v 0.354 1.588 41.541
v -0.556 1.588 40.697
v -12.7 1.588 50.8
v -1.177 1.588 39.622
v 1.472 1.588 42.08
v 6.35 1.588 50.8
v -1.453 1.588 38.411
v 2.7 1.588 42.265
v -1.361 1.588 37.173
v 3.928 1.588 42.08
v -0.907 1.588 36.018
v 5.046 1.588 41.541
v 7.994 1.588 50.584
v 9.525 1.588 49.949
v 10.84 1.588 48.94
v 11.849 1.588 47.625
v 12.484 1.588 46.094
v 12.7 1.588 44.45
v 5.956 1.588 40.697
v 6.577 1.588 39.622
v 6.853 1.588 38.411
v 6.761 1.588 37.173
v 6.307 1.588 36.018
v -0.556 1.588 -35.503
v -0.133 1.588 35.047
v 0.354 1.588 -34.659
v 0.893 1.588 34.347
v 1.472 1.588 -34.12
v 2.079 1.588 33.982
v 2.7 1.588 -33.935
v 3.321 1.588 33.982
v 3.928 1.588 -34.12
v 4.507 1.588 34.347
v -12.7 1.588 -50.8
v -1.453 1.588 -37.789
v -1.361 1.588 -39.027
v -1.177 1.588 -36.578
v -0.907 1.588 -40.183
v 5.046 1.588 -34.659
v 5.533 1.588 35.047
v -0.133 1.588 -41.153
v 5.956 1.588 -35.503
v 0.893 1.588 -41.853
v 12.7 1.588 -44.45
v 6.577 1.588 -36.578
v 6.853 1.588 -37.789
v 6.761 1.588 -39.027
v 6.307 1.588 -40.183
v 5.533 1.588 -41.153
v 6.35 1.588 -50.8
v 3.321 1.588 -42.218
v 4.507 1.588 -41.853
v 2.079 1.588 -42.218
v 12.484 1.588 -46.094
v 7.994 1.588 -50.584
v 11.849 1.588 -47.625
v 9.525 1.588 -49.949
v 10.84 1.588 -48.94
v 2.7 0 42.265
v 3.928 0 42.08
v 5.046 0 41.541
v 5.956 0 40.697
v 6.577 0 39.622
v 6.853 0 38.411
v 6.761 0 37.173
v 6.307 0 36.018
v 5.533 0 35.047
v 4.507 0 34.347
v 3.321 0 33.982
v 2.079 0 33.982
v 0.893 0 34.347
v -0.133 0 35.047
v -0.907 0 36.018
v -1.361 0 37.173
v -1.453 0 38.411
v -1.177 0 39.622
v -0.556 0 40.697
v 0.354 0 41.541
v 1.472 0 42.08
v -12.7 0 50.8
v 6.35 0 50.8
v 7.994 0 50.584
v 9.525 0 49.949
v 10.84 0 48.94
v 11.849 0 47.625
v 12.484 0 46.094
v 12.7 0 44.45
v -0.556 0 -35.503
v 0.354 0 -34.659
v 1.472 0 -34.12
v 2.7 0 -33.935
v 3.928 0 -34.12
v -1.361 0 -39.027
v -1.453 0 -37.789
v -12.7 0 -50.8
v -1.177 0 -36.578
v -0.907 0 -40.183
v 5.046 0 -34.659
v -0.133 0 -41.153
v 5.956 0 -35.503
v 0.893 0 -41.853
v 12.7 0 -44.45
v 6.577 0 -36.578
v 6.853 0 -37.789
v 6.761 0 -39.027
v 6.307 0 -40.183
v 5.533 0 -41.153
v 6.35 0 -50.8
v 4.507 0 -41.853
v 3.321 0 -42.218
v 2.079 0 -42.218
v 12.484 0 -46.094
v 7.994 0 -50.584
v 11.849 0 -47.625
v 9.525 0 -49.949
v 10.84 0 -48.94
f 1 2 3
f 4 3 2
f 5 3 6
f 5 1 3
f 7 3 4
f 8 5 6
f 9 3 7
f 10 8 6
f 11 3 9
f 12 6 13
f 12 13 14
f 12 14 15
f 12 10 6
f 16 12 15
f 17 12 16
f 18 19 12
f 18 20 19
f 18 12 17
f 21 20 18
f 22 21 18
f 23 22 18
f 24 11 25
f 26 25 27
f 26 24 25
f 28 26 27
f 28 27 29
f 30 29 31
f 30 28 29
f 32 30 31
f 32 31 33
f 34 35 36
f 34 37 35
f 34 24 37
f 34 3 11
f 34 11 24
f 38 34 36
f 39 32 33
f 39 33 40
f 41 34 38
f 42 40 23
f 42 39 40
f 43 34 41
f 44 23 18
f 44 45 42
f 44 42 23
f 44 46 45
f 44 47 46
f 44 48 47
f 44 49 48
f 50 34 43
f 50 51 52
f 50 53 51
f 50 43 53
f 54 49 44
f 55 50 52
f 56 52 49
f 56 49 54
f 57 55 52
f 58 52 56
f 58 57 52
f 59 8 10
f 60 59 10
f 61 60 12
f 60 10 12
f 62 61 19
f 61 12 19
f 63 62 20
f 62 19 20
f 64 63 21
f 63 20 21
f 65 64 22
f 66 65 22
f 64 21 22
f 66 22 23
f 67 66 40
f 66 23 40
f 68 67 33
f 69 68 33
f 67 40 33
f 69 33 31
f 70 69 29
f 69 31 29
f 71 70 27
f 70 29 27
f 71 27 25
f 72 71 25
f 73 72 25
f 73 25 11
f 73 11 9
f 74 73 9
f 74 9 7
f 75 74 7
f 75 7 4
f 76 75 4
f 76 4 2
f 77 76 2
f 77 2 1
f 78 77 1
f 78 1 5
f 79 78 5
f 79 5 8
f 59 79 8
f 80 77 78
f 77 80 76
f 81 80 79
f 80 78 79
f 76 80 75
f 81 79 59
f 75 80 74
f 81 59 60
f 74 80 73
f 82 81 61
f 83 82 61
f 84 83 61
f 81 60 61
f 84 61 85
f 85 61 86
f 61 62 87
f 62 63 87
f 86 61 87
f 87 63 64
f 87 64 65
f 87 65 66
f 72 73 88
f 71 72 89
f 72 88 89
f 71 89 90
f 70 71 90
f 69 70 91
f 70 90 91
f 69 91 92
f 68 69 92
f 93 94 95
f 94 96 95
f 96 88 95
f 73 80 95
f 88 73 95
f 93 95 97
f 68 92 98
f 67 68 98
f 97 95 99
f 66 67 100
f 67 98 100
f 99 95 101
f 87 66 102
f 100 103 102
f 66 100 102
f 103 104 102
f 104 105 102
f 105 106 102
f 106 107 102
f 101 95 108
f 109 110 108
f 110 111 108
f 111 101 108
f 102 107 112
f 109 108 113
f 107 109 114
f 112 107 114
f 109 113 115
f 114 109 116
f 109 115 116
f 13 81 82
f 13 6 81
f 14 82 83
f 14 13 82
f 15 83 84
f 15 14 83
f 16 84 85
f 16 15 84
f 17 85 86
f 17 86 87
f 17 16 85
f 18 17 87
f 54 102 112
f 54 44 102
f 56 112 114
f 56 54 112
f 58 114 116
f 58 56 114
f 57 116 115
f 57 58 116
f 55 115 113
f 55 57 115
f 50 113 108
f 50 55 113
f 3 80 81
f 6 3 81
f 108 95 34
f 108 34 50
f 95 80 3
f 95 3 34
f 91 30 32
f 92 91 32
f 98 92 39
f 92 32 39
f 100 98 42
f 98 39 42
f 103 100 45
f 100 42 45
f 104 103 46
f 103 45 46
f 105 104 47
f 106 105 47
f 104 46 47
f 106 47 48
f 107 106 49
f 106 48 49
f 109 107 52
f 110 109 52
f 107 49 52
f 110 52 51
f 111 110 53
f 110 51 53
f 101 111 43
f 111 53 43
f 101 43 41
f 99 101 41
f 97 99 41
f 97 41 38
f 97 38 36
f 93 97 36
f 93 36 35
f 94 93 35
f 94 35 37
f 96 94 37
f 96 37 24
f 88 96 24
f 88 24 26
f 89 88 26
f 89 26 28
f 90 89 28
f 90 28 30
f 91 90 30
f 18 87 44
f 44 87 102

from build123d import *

# Parameters (mm, degrees)
SKETCH1_W           = 25.4
SKETCH1_H           = 101.6
BOSS_EXTRUDE1_DEPTH = 1.5875
FILLET2_R           = 6.35
CUT_EXTRUDE1_REACH  = 54.388
SKETCH2_R           = 4.165


with BuildPart() as part:
    # Sketch1 → Boss-Extrude1 (new body)
    with BuildSketch(Plane(origin=(0, 0, 0), x_dir=(1, 0, 0), z_dir=(0, 1, 0))):
        Rectangle(SKETCH1_W, SKETCH1_H)
    extrude(amount=BOSS_EXTRUDE1_DEPTH)

    # Fillet2
    fillet2_edges = [part.edges().sort_by_distance(p)[0] for p in [
        (12.7, 0.79375, 50.8),
        (12.7, 0.79375, -50.8),
    ]]
    fillet(fillet2_edges, radius=FILLET2_R)

    # Sketch2 → Cut-Extrude1 (cut, up to next)
    with BuildSketch(Plane(origin=(0, 1.5875, 0), x_dir=(1, 0, 0), z_dir=(0, 1, 0)), mode=Mode.PRIVATE) as cut_extrude1_sk1:
        with Locations(Location((2.7, 38.1, 0), (0, 0, 270))):
            Circle(SKETCH2_R)
    cut_extrude1_tool1 = extrude(cut_extrude1_sk1.sketch, amount=-CUT_EXTRUDE1_REACH, mode=Mode.PRIVATE) & part.part
    # Sketch2 → Cut-Extrude1 (cut, up to next)
    with BuildSketch(Plane(origin=(0, 1.5875, 0), x_dir=(1, 0, 0), z_dir=(0, 1, 0)), mode=Mode.PRIVATE) as cut_extrude1_sk2:
        with Locations(Location((2.7, -38.1, 0), (0, 0, 270))):
            Circle(SKETCH2_R)
    cut_extrude1_tool2 = extrude(cut_extrude1_sk2.sketch, amount=-CUT_EXTRUDE1_REACH, mode=Mode.PRIVATE) & part.part
    add(cut_extrude1_tool1.solids().sort_by_distance((2.7, 1.5875, -38.1))[0], mode=Mode.SUBTRACT)
    add(cut_extrude1_tool2.solids().sort_by_distance((2.7, 1.5875, 38.1))[0], mode=Mode.SUBTRACT)


solid = part.part
